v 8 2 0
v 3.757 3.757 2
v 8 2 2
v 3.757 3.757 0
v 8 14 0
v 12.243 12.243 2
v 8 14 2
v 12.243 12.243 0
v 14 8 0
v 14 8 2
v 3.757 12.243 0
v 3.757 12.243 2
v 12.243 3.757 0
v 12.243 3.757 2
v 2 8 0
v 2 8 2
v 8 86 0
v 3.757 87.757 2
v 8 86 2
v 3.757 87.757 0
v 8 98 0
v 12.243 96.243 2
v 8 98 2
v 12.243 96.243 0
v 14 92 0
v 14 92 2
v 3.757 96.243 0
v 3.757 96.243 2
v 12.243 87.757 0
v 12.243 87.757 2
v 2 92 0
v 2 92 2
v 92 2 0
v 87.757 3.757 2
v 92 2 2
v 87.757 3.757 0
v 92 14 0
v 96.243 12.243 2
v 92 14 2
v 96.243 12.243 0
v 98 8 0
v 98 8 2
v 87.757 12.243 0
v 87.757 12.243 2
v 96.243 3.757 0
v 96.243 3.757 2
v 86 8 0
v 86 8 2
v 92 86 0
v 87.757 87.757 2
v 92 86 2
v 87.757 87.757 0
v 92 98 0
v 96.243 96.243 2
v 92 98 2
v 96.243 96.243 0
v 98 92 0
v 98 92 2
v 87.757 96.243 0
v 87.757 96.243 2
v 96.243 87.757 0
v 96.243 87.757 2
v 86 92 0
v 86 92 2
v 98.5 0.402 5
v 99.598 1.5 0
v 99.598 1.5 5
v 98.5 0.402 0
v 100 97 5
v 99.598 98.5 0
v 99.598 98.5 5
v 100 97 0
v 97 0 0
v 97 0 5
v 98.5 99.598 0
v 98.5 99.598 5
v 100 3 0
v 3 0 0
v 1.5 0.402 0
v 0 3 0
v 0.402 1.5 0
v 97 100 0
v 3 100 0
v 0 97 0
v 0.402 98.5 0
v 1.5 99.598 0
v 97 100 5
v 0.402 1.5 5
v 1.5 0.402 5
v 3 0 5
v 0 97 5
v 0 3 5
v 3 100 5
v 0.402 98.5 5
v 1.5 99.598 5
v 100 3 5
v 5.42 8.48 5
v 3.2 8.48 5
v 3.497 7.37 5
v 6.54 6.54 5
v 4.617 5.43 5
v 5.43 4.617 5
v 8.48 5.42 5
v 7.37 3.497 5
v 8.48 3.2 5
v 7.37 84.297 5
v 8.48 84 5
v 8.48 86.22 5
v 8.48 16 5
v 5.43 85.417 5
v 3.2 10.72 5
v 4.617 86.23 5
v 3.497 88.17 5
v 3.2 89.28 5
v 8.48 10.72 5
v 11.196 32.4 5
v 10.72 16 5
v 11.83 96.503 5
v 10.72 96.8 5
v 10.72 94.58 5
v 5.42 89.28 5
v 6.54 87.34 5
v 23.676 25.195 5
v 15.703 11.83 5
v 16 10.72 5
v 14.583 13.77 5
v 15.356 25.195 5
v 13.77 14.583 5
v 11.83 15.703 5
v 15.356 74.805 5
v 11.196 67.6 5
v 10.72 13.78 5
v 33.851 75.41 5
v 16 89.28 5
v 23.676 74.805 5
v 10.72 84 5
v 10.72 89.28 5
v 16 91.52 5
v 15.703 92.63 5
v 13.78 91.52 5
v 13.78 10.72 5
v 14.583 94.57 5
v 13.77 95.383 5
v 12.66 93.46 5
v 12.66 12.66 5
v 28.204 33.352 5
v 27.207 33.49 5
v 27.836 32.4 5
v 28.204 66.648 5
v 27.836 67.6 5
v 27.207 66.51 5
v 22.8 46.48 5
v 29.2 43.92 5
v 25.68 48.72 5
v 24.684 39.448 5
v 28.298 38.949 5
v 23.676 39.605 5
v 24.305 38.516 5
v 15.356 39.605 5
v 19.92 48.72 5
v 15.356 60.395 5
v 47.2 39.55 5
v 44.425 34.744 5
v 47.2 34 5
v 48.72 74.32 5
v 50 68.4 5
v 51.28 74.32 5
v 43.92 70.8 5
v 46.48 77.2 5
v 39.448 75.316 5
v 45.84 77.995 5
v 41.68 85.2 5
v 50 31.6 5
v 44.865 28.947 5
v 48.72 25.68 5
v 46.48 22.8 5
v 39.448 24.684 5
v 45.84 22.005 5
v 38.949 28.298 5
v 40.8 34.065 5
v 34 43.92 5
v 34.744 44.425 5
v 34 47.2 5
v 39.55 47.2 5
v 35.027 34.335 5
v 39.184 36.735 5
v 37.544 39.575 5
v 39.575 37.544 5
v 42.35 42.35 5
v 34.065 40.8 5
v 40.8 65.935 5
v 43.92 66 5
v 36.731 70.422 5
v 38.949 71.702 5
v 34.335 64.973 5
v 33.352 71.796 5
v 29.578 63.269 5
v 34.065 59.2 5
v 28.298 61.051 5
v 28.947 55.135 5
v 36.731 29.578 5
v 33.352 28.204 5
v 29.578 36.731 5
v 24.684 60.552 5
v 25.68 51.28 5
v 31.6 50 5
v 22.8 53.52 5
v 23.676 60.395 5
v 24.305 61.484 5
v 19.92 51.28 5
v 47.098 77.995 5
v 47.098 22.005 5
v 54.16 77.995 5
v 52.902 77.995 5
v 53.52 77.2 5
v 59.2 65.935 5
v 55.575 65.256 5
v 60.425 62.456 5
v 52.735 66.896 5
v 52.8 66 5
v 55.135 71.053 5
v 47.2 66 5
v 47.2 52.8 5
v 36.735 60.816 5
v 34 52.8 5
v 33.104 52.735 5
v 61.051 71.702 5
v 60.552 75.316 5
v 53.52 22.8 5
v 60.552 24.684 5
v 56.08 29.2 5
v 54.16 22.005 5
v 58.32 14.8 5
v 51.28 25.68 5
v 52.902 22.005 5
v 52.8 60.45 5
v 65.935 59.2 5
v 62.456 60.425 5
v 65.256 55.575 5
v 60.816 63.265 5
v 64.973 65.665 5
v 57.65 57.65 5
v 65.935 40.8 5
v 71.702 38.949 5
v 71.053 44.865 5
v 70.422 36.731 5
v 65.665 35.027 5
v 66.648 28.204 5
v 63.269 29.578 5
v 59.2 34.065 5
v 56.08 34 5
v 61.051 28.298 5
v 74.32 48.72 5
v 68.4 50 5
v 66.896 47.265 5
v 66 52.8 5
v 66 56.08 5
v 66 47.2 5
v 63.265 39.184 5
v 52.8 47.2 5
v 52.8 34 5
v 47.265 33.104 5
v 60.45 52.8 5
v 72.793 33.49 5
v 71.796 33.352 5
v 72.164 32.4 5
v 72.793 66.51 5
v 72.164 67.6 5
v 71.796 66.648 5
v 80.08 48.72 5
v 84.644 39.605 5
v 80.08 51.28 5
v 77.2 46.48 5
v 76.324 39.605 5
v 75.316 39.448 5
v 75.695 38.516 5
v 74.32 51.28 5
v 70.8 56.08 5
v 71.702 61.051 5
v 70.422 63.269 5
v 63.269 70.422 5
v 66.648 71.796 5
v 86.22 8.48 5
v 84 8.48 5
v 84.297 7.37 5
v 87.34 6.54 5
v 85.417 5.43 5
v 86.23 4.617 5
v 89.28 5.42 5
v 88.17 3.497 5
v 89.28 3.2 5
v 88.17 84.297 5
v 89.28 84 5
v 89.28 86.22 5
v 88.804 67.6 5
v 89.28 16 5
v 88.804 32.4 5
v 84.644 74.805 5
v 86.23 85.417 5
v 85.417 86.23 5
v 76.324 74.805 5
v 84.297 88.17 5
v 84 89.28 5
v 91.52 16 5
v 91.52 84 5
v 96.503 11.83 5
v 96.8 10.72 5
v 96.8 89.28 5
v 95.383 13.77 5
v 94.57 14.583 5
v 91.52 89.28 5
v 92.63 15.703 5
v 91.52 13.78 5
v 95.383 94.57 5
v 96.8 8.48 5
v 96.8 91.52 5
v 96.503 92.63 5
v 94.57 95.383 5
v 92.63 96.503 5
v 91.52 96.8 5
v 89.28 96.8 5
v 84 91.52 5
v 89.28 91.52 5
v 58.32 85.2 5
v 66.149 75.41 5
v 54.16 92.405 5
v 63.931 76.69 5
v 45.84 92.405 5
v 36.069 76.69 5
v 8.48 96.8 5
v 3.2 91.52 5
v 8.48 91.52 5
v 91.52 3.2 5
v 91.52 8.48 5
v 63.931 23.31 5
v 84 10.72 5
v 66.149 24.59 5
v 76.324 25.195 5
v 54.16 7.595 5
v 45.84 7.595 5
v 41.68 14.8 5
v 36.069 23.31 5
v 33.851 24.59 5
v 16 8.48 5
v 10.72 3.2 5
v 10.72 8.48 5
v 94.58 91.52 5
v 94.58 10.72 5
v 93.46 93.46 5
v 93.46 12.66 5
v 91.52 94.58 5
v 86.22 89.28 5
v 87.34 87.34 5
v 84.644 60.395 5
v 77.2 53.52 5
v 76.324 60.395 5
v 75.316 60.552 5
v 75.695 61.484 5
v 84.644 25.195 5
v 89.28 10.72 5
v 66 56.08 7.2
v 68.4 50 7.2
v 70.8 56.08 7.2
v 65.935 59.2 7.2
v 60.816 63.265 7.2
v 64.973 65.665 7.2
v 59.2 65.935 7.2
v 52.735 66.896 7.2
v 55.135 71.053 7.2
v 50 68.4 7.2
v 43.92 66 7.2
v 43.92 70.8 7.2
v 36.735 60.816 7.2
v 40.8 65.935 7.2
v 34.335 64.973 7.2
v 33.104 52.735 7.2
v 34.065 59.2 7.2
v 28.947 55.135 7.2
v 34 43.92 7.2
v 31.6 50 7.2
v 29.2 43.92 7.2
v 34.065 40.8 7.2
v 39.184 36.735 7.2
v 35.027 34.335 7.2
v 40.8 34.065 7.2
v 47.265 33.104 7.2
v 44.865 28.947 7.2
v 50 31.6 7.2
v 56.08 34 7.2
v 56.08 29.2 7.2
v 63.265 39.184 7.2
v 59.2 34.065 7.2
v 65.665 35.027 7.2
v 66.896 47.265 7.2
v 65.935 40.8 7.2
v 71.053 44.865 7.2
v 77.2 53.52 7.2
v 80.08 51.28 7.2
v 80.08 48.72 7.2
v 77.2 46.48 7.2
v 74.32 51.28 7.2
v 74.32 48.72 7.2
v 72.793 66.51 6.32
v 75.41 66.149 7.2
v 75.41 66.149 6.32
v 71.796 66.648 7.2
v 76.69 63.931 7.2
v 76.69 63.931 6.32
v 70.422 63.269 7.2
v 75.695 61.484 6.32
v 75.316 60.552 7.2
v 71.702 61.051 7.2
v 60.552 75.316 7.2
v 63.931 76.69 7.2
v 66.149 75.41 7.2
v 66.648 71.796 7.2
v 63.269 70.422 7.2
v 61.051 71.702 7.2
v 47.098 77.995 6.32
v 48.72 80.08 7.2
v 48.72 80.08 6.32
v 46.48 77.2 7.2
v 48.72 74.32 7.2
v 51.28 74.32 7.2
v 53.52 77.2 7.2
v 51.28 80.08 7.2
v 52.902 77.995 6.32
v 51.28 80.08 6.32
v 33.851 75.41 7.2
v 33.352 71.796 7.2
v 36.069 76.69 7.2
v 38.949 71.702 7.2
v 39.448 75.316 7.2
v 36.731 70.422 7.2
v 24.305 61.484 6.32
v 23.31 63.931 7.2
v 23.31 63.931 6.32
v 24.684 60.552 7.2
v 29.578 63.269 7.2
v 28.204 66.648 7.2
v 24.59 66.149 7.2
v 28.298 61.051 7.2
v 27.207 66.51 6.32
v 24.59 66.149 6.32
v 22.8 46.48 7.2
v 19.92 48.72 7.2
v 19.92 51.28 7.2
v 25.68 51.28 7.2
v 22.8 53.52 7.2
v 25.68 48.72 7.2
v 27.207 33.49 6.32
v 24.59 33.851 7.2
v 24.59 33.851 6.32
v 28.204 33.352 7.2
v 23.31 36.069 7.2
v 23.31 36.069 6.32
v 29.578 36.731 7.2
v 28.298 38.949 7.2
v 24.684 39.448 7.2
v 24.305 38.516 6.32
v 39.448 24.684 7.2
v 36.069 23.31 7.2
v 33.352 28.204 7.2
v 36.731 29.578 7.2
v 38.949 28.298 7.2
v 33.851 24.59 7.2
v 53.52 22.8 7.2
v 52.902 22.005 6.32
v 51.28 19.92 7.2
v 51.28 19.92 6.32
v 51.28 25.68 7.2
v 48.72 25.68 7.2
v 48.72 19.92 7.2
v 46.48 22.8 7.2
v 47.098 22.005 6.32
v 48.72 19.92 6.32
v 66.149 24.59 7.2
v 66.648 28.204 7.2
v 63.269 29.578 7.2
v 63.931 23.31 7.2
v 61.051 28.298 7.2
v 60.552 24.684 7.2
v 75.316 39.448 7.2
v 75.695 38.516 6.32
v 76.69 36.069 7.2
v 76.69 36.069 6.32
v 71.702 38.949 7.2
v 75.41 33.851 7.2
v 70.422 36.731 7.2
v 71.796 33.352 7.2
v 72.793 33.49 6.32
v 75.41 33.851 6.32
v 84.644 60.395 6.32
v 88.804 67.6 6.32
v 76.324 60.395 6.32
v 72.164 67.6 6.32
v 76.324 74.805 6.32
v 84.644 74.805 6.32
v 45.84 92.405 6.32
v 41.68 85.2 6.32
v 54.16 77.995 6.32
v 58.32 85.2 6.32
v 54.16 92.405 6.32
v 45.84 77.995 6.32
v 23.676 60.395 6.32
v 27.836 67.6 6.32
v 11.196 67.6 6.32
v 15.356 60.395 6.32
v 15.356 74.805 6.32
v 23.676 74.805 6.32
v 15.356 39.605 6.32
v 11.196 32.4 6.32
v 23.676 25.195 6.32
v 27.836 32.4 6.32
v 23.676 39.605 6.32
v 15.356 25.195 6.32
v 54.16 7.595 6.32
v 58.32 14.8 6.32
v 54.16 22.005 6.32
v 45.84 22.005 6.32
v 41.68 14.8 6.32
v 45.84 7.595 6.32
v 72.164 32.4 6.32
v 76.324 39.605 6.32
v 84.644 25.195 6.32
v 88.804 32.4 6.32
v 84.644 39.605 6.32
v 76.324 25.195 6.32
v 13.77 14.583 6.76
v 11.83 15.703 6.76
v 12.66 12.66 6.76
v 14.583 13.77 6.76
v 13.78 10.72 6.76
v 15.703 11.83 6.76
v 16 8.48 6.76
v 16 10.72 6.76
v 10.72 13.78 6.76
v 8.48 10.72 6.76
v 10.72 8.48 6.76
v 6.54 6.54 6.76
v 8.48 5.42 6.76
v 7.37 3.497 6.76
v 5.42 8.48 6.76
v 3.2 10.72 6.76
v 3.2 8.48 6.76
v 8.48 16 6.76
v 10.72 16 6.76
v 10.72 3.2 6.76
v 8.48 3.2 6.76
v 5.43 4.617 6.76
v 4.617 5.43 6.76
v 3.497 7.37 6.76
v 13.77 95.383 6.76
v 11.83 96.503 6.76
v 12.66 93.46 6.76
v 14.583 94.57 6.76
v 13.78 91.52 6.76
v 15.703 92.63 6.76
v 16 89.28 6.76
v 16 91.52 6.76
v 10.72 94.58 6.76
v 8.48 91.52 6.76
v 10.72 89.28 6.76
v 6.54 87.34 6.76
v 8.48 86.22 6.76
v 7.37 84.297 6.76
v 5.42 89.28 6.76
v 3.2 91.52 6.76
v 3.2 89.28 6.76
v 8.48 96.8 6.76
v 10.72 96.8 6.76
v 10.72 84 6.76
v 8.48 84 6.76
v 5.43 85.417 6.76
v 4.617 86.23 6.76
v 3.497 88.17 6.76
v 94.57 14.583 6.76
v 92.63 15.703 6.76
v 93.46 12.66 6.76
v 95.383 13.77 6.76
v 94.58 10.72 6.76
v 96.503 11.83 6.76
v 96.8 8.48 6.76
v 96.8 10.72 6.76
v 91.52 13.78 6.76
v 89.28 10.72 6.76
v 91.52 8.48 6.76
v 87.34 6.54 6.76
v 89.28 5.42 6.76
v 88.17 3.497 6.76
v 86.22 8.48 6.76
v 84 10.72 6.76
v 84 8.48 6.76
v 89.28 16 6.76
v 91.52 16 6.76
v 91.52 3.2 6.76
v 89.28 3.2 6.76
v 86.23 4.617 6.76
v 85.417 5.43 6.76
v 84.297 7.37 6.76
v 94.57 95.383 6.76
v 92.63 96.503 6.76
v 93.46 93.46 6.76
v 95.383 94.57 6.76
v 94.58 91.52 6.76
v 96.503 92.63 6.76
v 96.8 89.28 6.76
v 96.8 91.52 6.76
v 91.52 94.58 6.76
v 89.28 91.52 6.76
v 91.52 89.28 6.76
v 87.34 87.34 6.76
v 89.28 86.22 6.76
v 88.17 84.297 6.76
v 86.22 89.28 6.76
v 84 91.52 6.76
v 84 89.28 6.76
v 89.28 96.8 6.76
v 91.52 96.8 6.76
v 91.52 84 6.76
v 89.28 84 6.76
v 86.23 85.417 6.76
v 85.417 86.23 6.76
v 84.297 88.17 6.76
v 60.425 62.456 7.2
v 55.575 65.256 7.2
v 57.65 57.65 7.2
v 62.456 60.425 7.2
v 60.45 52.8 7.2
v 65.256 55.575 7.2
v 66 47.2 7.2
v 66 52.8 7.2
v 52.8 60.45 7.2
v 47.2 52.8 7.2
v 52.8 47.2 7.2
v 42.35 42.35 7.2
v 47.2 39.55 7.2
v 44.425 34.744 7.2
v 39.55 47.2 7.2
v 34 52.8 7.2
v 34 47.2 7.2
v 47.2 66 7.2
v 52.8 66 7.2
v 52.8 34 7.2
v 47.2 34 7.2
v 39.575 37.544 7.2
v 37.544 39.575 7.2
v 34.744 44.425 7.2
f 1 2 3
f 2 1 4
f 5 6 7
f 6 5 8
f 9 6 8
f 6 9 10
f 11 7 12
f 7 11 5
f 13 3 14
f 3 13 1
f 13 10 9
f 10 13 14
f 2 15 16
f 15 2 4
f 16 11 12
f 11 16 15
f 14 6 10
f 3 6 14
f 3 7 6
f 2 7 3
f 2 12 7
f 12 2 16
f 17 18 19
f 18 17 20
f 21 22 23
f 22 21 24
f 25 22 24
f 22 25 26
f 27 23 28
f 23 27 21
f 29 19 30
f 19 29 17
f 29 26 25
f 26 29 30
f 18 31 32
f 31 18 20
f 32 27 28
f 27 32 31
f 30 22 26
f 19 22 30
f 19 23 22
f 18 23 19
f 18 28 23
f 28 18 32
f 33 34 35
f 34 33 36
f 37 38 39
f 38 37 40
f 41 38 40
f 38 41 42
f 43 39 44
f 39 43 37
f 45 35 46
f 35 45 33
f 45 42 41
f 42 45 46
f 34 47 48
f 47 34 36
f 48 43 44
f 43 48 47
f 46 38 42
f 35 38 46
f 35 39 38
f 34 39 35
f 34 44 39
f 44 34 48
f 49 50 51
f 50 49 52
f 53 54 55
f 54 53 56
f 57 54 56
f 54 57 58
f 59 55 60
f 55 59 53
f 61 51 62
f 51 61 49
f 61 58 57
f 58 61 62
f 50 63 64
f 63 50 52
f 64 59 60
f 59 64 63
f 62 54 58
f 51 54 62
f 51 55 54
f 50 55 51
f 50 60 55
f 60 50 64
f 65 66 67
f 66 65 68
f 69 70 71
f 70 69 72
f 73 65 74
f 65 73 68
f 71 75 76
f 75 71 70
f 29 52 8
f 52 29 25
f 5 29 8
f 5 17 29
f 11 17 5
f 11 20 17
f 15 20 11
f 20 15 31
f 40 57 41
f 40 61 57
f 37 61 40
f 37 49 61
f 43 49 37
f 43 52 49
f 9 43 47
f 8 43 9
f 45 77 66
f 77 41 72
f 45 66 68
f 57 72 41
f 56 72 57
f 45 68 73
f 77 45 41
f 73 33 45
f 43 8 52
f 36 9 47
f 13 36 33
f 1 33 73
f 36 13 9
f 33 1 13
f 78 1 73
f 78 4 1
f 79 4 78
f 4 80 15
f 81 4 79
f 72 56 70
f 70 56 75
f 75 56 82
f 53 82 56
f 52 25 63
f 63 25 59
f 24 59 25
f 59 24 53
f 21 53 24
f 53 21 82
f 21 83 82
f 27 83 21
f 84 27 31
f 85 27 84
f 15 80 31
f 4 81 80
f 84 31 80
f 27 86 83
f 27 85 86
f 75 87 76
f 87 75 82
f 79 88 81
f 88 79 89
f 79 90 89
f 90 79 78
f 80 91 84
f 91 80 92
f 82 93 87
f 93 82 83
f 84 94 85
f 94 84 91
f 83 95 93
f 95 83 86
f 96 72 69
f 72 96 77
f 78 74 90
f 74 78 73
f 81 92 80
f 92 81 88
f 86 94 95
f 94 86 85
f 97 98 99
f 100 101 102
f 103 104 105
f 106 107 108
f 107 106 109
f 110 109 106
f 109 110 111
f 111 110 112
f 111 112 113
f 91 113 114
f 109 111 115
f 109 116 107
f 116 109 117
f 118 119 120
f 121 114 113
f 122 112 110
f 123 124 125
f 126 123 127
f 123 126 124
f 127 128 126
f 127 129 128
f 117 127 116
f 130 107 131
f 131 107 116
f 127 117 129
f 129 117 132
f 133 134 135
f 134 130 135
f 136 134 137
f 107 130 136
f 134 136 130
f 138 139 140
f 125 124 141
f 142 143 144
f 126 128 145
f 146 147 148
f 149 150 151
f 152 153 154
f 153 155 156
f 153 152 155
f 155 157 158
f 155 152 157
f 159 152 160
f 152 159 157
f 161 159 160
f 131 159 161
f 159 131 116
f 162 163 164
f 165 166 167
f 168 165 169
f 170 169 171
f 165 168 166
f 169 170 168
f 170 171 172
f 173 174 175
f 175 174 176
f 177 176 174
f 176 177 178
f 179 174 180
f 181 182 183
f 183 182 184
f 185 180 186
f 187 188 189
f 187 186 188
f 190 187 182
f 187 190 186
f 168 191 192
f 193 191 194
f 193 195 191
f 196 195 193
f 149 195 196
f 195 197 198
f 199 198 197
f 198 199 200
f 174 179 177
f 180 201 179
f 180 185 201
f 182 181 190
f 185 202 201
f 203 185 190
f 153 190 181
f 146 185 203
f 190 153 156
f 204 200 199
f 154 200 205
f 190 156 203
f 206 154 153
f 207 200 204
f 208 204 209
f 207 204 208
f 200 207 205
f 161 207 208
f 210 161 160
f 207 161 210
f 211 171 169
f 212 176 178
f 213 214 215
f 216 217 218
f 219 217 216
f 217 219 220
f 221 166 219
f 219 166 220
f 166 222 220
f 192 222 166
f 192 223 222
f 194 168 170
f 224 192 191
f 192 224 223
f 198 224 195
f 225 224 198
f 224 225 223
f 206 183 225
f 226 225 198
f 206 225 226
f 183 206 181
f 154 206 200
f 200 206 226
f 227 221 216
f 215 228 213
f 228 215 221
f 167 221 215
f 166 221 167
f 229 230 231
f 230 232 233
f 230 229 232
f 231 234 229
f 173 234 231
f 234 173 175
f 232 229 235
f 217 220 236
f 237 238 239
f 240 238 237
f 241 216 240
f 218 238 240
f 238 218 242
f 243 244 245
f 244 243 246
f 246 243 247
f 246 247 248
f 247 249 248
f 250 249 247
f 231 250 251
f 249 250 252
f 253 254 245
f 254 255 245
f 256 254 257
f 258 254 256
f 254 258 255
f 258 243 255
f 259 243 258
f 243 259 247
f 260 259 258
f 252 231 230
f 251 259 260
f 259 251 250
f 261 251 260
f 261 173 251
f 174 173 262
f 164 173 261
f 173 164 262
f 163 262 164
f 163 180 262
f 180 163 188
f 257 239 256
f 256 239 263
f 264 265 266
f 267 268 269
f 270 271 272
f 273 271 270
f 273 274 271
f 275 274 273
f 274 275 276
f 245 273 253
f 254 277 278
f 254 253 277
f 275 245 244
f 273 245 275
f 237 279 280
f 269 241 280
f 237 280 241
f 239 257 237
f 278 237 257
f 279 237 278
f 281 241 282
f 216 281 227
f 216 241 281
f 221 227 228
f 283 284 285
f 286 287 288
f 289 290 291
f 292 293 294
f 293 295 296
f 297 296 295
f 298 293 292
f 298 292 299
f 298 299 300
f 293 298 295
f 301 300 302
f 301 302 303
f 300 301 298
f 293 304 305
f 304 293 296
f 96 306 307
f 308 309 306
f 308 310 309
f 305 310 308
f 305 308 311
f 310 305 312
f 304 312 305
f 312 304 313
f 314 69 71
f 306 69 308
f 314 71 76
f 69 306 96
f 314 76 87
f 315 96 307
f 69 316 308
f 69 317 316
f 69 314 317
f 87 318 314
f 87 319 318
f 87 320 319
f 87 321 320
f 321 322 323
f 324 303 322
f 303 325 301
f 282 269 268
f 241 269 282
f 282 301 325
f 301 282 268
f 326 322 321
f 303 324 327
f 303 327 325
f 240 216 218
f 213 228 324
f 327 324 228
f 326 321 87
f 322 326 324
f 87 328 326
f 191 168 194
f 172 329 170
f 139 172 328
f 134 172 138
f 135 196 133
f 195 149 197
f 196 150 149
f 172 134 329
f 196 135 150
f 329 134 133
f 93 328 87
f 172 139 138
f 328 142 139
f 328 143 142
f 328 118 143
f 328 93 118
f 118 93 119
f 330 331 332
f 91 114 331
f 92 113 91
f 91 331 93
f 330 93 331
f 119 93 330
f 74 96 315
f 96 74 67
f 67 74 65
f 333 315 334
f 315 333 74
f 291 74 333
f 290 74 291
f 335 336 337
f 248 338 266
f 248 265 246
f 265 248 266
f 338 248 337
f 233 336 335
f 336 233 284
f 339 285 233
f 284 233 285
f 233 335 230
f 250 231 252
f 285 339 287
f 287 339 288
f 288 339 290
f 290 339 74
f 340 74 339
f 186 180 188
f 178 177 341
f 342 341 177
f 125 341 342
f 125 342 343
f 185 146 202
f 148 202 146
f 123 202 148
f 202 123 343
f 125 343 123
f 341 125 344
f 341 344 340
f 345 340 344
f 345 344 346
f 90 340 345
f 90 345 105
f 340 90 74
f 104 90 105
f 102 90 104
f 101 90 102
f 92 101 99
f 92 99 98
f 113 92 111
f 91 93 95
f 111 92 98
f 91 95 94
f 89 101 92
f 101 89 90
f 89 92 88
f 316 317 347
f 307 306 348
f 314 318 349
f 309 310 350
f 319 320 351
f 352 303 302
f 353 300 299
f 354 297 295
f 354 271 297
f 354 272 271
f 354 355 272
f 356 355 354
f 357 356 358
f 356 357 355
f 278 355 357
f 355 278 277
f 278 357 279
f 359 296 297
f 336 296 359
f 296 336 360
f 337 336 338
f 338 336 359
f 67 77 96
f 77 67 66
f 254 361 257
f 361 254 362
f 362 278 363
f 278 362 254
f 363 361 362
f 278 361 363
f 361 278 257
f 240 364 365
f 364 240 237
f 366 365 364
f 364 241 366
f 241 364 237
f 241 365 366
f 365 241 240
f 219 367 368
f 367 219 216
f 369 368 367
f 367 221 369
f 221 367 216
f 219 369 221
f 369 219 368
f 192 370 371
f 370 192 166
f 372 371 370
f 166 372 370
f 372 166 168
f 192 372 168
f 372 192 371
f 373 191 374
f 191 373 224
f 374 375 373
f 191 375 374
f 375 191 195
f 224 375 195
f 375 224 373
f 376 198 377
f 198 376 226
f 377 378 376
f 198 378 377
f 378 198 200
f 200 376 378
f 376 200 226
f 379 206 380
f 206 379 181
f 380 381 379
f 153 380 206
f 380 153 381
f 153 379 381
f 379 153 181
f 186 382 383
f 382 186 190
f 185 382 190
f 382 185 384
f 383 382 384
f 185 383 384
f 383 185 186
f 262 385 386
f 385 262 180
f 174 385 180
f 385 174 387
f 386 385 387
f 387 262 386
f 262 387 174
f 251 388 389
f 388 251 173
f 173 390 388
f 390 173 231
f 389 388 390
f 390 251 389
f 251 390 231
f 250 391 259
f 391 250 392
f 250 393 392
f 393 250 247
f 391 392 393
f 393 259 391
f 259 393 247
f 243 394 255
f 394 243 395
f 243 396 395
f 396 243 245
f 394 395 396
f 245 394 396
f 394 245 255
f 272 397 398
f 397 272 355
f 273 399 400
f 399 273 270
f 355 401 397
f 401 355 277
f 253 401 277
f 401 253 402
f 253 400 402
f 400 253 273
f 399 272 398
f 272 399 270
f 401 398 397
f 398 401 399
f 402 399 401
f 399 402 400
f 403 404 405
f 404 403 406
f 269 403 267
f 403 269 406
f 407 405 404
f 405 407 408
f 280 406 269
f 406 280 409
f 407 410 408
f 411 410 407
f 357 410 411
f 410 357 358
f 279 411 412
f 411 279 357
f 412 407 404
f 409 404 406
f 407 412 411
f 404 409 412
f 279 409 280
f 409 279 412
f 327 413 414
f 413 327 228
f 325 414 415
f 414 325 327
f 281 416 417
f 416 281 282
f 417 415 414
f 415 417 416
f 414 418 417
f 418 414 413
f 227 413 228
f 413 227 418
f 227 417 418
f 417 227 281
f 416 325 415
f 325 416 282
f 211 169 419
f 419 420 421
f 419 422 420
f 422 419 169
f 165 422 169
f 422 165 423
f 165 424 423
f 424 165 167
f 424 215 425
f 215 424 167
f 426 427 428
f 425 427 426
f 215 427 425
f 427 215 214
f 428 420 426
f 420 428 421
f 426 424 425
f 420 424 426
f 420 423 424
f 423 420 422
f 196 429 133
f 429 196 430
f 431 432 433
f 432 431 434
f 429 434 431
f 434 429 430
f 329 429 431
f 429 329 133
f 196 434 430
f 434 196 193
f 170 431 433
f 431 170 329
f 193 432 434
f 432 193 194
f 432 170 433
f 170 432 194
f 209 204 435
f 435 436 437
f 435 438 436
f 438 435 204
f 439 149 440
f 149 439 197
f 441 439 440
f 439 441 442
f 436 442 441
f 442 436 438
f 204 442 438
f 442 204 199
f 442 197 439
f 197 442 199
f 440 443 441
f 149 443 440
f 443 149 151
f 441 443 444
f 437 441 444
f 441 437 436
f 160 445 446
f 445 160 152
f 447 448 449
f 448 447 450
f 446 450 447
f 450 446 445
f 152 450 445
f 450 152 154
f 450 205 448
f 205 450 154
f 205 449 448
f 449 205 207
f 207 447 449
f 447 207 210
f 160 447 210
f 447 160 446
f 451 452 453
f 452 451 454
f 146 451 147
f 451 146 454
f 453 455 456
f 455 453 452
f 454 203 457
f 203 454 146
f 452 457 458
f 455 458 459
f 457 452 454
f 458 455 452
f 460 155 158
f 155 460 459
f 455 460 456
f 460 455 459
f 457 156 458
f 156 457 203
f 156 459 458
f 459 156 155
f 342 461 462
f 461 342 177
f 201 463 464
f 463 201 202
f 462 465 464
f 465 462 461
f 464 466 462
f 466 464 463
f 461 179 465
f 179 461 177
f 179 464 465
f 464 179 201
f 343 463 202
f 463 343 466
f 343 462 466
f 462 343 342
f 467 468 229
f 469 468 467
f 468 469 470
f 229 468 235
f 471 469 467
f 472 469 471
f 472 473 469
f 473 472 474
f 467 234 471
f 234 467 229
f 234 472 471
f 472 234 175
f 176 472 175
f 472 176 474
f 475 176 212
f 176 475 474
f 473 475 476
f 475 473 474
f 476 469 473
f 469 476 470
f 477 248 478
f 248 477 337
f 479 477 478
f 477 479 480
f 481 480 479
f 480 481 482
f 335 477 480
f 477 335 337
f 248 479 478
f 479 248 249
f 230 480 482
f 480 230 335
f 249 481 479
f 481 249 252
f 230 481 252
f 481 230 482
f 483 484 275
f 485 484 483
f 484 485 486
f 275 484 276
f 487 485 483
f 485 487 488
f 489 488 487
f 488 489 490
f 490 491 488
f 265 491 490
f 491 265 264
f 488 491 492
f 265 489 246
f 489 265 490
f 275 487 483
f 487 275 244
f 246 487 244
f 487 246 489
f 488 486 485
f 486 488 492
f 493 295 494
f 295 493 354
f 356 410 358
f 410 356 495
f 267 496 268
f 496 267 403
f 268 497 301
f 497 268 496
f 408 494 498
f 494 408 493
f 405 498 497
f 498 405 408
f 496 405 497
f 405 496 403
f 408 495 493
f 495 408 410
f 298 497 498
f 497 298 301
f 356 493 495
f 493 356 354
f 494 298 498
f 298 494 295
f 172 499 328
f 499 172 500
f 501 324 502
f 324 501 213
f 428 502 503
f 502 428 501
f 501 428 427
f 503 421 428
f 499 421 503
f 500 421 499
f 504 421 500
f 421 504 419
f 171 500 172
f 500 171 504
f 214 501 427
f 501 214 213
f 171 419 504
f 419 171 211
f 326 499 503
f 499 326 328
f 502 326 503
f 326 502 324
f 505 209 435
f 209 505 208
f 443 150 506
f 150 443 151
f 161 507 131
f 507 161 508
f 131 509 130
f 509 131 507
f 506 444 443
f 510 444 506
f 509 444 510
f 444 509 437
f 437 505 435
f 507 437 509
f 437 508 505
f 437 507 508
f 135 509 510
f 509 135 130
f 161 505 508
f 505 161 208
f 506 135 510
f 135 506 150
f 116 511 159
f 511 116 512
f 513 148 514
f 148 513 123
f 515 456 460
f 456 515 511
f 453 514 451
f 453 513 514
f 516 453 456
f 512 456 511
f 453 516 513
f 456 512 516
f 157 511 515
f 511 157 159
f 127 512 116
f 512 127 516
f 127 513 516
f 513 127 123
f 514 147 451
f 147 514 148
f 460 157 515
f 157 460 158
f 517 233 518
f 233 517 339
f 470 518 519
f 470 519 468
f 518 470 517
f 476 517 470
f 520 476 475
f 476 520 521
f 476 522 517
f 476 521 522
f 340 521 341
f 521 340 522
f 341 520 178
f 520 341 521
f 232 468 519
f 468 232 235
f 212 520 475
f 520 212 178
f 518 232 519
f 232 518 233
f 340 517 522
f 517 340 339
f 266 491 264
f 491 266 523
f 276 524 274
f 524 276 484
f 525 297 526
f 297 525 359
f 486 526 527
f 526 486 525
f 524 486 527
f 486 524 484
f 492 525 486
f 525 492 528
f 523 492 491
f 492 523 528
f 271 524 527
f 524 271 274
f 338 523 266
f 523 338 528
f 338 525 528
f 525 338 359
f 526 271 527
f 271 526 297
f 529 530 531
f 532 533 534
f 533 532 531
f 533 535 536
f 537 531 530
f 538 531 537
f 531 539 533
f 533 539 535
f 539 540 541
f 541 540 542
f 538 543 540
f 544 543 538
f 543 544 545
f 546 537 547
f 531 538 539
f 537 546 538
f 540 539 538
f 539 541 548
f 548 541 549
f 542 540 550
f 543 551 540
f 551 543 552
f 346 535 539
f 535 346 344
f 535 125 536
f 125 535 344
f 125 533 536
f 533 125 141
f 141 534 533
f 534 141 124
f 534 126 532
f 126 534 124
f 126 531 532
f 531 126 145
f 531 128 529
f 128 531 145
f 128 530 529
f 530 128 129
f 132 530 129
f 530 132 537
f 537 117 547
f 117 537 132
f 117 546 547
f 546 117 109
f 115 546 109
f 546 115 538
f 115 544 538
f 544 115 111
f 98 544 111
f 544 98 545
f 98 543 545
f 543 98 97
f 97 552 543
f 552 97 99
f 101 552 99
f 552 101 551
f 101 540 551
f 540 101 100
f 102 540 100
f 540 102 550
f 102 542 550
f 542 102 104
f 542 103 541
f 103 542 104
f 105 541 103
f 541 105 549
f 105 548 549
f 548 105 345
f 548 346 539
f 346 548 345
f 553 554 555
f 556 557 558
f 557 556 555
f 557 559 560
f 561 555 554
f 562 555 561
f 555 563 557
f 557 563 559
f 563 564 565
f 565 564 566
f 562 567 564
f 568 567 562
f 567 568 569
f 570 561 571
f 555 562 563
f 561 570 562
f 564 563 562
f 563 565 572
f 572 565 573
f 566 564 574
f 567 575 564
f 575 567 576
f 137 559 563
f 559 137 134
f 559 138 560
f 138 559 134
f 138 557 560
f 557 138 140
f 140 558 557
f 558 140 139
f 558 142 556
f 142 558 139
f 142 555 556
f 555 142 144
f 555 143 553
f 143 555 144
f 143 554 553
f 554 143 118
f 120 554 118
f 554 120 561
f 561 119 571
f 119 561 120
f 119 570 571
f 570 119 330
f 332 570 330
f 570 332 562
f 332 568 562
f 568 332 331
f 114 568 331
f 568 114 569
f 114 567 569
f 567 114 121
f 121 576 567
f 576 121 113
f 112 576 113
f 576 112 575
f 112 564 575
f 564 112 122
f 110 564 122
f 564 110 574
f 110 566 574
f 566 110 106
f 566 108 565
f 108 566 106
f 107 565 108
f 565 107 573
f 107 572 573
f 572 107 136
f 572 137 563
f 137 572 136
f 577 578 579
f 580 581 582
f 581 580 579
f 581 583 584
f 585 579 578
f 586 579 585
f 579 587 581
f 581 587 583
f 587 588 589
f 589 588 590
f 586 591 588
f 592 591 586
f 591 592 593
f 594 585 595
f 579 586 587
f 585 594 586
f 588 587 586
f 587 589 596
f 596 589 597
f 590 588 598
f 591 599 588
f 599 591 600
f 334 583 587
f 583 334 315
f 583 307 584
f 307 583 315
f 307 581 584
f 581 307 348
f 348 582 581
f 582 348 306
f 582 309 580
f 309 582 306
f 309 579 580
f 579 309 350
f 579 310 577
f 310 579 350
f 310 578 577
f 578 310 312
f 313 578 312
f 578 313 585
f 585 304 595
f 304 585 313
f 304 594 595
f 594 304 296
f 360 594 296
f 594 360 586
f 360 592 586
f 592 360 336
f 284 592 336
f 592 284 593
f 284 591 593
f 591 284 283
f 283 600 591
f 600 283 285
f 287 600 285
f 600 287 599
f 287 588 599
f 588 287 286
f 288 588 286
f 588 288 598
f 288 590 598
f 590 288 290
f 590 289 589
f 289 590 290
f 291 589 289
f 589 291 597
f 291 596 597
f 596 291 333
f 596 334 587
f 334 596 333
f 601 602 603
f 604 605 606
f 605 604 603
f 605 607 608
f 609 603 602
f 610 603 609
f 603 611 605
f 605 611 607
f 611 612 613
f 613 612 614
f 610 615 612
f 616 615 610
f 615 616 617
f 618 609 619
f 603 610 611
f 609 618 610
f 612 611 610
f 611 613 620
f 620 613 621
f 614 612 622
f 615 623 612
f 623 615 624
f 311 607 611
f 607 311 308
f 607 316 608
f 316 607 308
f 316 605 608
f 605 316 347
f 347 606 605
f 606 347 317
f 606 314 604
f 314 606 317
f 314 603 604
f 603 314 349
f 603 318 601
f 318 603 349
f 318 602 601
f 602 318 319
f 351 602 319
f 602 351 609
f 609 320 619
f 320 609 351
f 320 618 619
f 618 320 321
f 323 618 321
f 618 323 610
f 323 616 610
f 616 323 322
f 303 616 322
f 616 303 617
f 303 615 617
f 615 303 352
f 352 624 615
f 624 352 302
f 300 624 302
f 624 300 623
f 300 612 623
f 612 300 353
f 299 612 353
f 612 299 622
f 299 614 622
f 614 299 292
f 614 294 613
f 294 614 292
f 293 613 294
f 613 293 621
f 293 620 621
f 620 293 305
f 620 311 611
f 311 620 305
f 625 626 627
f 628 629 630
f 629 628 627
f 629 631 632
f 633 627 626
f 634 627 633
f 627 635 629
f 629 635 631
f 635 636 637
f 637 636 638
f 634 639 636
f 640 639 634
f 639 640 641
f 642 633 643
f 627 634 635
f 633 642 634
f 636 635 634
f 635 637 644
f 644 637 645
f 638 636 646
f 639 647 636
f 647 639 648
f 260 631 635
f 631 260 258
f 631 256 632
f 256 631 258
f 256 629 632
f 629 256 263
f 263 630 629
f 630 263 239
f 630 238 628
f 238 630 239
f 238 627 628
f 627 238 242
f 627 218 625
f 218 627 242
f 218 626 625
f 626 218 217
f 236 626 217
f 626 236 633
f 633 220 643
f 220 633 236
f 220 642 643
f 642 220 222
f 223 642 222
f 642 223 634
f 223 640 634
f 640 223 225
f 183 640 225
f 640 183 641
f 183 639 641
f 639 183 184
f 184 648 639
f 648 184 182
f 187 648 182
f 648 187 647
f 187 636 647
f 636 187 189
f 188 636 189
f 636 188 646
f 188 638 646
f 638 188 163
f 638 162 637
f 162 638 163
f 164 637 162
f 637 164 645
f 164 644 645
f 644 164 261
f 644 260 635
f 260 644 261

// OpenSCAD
// Moroccan Zellige Tile Coaster — 12-Fold Star Pattern
// Traditional hand-cut tile geometry, mathematically exact
// DUAL COLOR: star/polygon (terracotta) | background (cream)
// PLA — 0.15mm, 3 walls, 15% infill
// 100mm coaster fits 4 on P2S plate

COASTER_W = 100;
COASTER_T = 5.0;
PATTERN_H = 2.2;
GROUT_W   = 1.8;   // Grout line width (gap between tiles)
BEVEL_R   = 0.5;

// 12-fold rosette: central 12-pointed star + surrounding shapes
module star_12(r, t) {
    linear_extrude(t)
        union() {
            for (i=[0:2])
                rotate([0,0,i*60]) square([r*1.8, r*0.42], center=true);
        }
}

// ── 12-pointed star ───────────────────────────────────
module dodecagram(r, t) {
    linear_extrude(t)
        union() {
            for (i=[0:3]) rotate([0,0,i*30]) square([r*2, r*0.35], center=true);
        }
}

// ── Kite shape (fills between star points) ────────────
module kite_fill(angle, dist, w, h, t) {
    rotate([0,0,angle])
        translate([dist, 0, 0])
            linear_extrude(t)
                polygon([[0,0],[-w/2,h],[w/2,h]]);
}

// ── Hexagon fill ──────────────────────────────────────
module hex_fill(cx, cy, r, t) {
    translate([cx,cy,0])
        linear_extrude(t)
            circle(r=r, $fn=6);
}

// ── Full zellige pattern ──────────────────────────────
module zellige_pattern() {
    C = COASTER_W/2;
    BASE_T = COASTER_T;
    PAT_T  = PATTERN_H;
    R      = C * 0.32;   // Central star radius

    // Central 12-pointed star
    translate([C,C,BASE_T])
        dodecagram(R, PAT_T);

    // 12 kite shapes around center
    for (i=[0:11])
        translate([C,C,BASE_T])
            kite_fill(i*30, R*1.15, R*0.3, R*0.38, PAT_T);

    // 12 outer shapes (elongated hexagons)
    for (i=[0:11]) {
        a = i * 30;
        r_out = R * 1.7;
        translate([C + cos(a)*r_out, C + sin(a)*r_out, BASE_T])
            rotate([0,0,a])
                linear_extrude(PAT_T)
                    polygon([
                        [0, R*0.22], [R*0.18, R*0.08],
                        [R*0.18, -R*0.08], [0, -R*0.22],
                        [-R*0.18, -R*0.08], [-R*0.18, R*0.08]
                    ]);
    }

    // 6 large hexagonal fills
    for (i=[0:5]) {
        a = i * 60 + 30;
        hex_fill(C + cos(a)*R*2.2, C + sin(a)*R*2.2, R*0.52, BASE_T + PAT_T*0.6);
    }

    // Corner accent stars (4 corners)
    CORNER_R = R * 0.4;
    for (cx=[CORNER_R*1.5, COASTER_W - CORNER_R*1.5],
         cy=[CORNER_R*1.5, COASTER_W - CORNER_R*1.5])
        translate([cx, cy, BASE_T])
            dodecagram(CORNER_R, PAT_T * 0.8);
}

// ── Coaster base (Color 1 — terracotta) ──────────────
module coaster_base() {
    difference() {
        // Slightly rounded base
        hull() {
            for (dx=[3,COASTER_W-3], dy=[3,COASTER_W-3])
                translate([dx,dy,0])
                    cylinder(r=3, h=COASTER_T, $fn=12);
        }
        // Anti-slip feet recesses (4 corners)
        for (cx=[8,COASTER_W-8], cy=[8,COASTER_W-8])
            translate([cx,cy,-1]) cylinder(d=12, h=3, $fn=8);
    }
}

coaster_base();
zellige_pattern();
